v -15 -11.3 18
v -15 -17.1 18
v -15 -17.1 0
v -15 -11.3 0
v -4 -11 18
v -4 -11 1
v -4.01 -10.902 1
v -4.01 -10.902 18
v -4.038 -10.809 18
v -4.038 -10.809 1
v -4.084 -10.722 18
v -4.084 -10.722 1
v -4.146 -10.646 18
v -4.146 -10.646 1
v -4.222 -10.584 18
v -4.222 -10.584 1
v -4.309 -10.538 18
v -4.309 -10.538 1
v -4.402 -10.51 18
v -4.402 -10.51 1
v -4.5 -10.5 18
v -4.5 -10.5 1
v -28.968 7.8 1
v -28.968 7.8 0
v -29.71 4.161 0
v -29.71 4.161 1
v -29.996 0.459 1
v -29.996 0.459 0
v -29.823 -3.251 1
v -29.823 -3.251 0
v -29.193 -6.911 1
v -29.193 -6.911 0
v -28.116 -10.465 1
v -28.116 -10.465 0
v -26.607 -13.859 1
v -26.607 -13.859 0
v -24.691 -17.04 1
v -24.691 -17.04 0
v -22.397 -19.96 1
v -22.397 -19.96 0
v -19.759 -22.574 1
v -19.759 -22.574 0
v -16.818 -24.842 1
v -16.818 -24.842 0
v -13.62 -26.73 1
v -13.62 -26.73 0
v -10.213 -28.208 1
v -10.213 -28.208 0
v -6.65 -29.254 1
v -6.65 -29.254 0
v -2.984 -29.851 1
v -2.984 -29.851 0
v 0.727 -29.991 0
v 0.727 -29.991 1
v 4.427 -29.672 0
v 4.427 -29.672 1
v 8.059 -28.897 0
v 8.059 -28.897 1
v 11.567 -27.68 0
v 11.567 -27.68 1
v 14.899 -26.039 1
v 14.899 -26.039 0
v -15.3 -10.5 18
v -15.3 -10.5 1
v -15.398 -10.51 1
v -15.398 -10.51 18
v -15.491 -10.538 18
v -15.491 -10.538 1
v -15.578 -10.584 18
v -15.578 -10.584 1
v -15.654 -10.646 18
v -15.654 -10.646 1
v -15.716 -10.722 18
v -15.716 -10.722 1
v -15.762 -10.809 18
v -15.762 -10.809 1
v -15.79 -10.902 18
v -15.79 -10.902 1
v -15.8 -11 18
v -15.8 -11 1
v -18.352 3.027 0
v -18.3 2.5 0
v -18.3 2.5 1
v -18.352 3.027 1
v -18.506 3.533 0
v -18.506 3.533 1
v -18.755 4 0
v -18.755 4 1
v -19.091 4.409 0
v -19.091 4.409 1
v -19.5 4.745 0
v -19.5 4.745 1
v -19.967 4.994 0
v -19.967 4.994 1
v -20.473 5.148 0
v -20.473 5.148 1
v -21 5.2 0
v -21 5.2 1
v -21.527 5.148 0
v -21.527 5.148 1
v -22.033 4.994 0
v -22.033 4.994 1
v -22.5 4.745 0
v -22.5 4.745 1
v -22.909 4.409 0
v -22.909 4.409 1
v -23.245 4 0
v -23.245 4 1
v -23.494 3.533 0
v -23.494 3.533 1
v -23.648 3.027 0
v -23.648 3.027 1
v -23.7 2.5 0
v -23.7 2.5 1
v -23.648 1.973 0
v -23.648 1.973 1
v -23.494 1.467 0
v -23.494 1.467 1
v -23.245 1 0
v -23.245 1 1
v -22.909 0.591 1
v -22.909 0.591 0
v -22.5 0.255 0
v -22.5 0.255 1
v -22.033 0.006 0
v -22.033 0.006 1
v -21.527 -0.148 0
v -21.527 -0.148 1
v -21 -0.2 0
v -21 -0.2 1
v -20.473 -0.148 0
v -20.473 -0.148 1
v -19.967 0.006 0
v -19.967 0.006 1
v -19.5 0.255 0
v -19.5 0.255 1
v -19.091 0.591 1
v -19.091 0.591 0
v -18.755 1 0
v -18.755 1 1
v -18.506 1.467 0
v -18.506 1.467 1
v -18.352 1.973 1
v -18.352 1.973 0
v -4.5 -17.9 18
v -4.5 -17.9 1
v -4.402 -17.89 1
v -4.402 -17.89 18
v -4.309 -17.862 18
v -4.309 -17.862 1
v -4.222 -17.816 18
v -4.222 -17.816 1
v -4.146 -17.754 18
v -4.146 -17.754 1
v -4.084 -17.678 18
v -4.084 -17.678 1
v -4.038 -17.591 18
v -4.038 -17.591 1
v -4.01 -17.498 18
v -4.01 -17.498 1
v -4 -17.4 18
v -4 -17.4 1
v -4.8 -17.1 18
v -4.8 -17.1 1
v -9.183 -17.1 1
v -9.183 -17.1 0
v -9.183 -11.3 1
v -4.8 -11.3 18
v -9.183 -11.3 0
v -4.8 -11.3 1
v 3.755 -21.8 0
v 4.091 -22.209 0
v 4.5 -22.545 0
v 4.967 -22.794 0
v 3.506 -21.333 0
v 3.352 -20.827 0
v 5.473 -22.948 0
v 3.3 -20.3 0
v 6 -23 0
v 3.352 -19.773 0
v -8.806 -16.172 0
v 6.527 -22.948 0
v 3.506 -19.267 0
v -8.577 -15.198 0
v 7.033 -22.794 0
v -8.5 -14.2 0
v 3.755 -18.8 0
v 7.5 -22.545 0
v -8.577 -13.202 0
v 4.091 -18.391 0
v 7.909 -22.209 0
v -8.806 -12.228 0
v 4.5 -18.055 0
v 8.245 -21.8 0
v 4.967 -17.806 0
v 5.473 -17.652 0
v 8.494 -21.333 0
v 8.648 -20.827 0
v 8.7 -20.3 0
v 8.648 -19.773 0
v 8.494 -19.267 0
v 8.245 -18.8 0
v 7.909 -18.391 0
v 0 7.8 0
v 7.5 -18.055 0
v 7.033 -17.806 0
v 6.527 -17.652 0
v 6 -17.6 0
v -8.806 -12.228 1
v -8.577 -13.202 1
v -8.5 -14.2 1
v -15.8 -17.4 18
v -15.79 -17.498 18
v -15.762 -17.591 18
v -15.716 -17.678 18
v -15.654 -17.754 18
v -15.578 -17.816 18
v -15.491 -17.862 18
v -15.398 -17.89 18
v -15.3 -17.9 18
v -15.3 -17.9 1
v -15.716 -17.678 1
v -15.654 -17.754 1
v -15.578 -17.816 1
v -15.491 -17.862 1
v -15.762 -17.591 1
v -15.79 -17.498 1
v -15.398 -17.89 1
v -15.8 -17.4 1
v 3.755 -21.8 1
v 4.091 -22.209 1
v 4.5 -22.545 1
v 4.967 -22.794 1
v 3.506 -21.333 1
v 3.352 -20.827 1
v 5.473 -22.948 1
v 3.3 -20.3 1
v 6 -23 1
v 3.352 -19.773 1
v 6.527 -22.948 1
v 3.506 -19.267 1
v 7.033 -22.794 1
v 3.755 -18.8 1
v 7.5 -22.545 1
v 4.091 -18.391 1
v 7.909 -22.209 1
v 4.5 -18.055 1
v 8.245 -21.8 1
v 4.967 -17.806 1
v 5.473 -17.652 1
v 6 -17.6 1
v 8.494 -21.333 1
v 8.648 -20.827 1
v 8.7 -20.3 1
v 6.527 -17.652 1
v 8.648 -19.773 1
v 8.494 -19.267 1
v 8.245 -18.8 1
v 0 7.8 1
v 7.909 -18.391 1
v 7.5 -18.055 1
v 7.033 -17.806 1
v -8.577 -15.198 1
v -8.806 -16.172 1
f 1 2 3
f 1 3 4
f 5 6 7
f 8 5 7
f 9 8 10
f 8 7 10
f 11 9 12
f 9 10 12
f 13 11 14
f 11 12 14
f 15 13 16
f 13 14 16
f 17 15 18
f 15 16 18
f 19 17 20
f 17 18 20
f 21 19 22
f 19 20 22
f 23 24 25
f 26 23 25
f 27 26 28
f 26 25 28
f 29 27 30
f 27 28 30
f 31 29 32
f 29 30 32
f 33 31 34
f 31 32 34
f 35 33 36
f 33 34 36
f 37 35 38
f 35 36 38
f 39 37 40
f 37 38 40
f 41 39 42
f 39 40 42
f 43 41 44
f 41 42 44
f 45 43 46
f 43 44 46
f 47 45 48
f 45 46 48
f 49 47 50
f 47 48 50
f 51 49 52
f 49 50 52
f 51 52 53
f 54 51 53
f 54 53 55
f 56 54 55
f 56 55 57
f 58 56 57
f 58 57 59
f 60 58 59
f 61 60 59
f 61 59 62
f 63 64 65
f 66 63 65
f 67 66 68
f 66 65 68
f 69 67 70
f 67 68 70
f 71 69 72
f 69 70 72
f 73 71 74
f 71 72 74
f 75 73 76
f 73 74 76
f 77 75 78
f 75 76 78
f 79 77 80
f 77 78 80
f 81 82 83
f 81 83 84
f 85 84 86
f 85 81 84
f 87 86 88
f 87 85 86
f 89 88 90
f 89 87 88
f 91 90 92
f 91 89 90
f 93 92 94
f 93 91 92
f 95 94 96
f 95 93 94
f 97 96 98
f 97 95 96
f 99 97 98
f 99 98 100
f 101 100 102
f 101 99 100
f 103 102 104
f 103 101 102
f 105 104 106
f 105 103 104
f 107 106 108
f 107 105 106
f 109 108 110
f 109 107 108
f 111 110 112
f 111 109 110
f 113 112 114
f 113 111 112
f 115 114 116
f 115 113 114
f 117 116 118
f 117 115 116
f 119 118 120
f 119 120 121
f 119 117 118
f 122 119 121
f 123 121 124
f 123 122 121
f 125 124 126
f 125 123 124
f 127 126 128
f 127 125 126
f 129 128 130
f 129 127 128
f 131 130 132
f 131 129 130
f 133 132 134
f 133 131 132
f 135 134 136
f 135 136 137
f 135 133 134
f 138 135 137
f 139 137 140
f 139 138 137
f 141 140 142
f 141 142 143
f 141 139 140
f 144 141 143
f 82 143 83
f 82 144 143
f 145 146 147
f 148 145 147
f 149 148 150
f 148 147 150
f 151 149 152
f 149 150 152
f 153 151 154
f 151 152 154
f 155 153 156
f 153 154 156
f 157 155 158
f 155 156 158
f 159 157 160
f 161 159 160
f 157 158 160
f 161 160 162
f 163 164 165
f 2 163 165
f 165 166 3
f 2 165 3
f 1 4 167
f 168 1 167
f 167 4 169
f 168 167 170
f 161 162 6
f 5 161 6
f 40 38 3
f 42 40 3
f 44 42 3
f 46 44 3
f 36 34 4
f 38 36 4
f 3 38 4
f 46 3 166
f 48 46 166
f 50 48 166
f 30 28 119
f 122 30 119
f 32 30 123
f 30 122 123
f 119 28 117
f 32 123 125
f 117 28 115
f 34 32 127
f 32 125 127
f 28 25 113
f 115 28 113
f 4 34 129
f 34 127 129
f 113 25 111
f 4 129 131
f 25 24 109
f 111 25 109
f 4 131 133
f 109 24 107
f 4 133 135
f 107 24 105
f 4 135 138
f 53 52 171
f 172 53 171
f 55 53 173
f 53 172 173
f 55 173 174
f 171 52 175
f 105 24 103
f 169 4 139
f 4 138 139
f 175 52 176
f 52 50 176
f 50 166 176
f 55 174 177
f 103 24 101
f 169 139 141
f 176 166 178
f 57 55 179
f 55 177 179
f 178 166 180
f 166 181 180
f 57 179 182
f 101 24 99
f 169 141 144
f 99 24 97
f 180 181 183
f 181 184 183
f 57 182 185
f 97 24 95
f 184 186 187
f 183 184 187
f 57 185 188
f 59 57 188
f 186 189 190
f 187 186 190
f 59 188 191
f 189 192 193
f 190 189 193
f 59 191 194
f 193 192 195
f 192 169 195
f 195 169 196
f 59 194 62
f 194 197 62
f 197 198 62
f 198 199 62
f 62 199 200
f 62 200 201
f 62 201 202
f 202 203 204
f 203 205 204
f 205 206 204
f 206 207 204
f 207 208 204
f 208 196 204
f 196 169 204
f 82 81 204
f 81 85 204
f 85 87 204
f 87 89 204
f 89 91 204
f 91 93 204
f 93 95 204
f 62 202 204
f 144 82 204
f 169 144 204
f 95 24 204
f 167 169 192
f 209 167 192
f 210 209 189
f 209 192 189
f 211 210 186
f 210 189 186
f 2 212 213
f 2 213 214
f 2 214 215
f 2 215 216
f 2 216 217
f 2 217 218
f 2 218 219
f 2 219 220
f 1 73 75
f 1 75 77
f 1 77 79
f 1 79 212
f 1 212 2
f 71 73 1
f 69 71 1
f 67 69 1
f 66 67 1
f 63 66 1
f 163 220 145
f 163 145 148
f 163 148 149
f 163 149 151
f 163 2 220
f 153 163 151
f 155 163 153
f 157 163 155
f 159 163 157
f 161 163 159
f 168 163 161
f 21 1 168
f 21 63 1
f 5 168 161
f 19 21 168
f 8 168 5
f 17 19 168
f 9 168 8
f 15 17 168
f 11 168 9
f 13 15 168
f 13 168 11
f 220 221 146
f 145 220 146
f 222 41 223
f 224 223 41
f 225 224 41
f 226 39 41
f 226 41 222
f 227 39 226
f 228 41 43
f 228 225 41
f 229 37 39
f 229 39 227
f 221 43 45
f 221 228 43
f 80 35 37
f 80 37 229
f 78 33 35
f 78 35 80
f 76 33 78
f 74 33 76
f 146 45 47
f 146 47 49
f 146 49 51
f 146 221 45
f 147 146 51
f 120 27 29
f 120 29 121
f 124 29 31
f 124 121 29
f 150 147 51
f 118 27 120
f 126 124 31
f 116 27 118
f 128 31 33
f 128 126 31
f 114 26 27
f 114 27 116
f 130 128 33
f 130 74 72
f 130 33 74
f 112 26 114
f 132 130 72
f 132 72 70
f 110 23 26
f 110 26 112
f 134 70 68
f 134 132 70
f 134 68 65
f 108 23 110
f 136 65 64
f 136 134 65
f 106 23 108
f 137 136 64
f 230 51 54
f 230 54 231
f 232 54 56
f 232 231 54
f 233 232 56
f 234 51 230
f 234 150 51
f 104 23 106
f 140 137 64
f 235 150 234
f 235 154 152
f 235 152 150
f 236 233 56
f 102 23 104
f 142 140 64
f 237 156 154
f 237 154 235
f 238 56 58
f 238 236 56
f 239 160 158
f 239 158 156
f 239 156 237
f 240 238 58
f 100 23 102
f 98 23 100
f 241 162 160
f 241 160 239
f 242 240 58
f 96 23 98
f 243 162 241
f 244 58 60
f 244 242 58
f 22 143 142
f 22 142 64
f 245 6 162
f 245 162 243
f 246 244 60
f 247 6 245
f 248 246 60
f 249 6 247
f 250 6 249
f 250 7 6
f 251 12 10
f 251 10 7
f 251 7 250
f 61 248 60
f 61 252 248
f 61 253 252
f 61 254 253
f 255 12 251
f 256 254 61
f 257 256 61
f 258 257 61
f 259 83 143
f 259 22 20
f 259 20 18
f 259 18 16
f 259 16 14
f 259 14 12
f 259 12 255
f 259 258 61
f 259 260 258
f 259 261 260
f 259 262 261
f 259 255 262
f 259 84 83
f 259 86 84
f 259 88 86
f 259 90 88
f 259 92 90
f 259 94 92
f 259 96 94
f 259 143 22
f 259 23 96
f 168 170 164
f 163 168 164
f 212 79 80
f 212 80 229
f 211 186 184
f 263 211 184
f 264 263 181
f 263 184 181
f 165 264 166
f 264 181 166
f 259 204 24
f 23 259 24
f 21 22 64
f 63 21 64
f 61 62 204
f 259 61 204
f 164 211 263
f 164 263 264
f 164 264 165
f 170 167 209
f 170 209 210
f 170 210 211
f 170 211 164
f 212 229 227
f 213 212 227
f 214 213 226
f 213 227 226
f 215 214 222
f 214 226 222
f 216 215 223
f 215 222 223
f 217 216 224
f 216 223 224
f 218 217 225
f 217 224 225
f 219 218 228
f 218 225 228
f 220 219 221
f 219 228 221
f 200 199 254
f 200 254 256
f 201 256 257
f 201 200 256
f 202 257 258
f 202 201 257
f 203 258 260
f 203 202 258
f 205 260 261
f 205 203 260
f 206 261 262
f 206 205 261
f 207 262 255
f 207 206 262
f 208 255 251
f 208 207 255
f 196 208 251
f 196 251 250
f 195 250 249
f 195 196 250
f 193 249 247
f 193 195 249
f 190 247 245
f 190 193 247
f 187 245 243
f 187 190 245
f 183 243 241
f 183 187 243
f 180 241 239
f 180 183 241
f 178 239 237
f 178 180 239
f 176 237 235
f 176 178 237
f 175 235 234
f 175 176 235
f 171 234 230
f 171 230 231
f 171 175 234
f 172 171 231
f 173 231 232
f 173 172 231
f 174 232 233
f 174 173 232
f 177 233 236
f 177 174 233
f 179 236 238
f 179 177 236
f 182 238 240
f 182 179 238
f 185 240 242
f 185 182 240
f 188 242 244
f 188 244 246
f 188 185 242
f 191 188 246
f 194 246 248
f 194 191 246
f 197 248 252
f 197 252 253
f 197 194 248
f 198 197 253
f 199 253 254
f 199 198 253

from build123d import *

# Parameters (mm, degrees)
F0_R     = 2.7
F1_DEPTH = 1
F2_DEPTH = 18


# Not quite as in the source:
# - a feature names something its author has since deleted; it is built from what else it names


with BuildPart() as f1:
    # F0 (on Top) → F1 (new body)
    with BuildSketch(Plane.XY):
        with BuildLine():
            Line((0, 7.8000635883), (-28.9682413691, 7.8000635883))
            ThreePointArc((-28.9682413691, 7.8000635883), (-18.3237536434, -23.7537376515), (14.8986014601, -26.039041352))
            Line((14.8986014601, -26.039041352), (0, 7.8000635883))
        make_face()
        with BuildLine():
            ThreePointArc((-9.6558443136, -17.9), (-21.5, -14.2), (-9.6558443136, -10.5))
            Line((-9.6558443136, -10.5), (-4.5, -10.5))
            ThreePointArc((-4.5, -10.5), (-4.1464466094, -10.6464466094), (-4, -11))
            Line((-4, -11), (-4, -17.4))
            ThreePointArc((-4, -17.4), (-4.1464466094, -17.7535533906), (-4.5, -17.9))
            Line((-4.5, -17.9), (-9.6558443136, -17.9))
        make_face(mode=Mode.SUBTRACT)
        with Locations((6, -20.3)):
            Circle(F0_R, mode=Mode.SUBTRACT)
        with Locations((-21, 2.5)):
            Circle(F0_R, mode=Mode.SUBTRACT)
        with BuildLine():
            Line((-15.3, -10.5), (-9.6558443136, -10.5))
            ThreePointArc((-9.6558443136, -10.5), (-21.5, -14.2), (-9.6558443136, -17.9))
            Line((-9.6558443136, -17.9), (-15.3, -17.9))
            ThreePointArc((-15.3, -17.9), (-15.6535533906, -17.7535533906), (-15.8, -17.4))
            Line((-15.8, -17.4), (-15.8, -11))
            ThreePointArc((-15.8, -11), (-15.6535533906, -10.6464466094), (-15.3, -10.5))
        make_face()
        with BuildLine():
            Line((-15, -11.3), (-9.1827841711, -11.3))
            ThreePointArc((-9.1827841711, -11.3), (-9.4049974508, -10.8915341207), (-9.6558443136, -10.5))
            Line((-9.6558443136, -10.5), (-15.3, -10.5))
            ThreePointArc((-15.3, -10.5), (-15.6535533906, -10.6464466094), (-15.8, -11))
            Line((-15.8, -11), (-15.8, -17.4))
            ThreePointArc((-15.8, -17.4), (-15.6535533906, -17.7535533906), (-15.3, -17.9))
            Line((-15.3, -17.9), (-9.6558443136, -17.9))
            ThreePointArc((-9.6558443136, -17.9), (-9.4049974508, -17.5084658793), (-9.1827841711, -17.1))
            Line((-9.1827841711, -17.1), (-15, -17.1))
            Line((-15, -17.1), (-15, -11.3))
        make_face()
        with BuildLine():
            ThreePointArc((-9.6558443136, -10.5), (-9.4049974508, -10.8915341207), (-9.1827841711, -11.3))
            Line((-9.1827841711, -11.3), (-4.8, -11.3))
            Line((-4.8, -11.3), (-4.8, -17.1))
            Line((-4.8, -17.1), (-9.1827841711, -17.1))
            ThreePointArc((-9.1827841711, -17.1), (-9.4049974508, -17.5084658793), (-9.6558443136, -17.9))
            Line((-9.6558443136, -17.9), (-4.5, -17.9))
            ThreePointArc((-4.5, -17.9), (-4.1464466094, -17.7535533906), (-4, -17.4))
            Line((-4, -17.4), (-4, -11))
            ThreePointArc((-4, -11), (-4.1464466094, -10.6464466094), (-4.5, -10.5))
            Line((-4.5, -10.5), (-9.6558443136, -10.5))
        make_face()
        with BuildLine():
            ThreePointArc((-9.1827841711, -11.3), (-8.6729982263, -12.7103528753), (-8.5, -14.2))
            ThreePointArc((-8.5, -14.2), (-8.6729982263, -15.6896471247), (-9.1827841711, -17.1))
            Line((-9.1827841711, -17.1), (-4.8, -17.1))
            Line((-4.8, -17.1), (-4.8, -11.3))
            Line((-4.8, -11.3), (-9.1827841711, -11.3))
        make_face()
    extrude(amount=F1_DEPTH)

    # F0 (on Top) → F2 (join)
    with BuildSketch(Plane.XY):
        with BuildLine():
            Line((-15, -11.3), (-9.1827841711, -11.3))
            ThreePointArc((-9.1827841711, -11.3), (-9.4049974508, -10.8915341207), (-9.6558443136, -10.5))
            Line((-9.6558443136, -10.5), (-15.3, -10.5))
            ThreePointArc((-15.3, -10.5), (-15.6535533906, -10.6464466094), (-15.8, -11))
            Line((-15.8, -11), (-15.8, -17.4))
            ThreePointArc((-15.8, -17.4), (-15.6535533906, -17.7535533906), (-15.3, -17.9))
            Line((-15.3, -17.9), (-9.6558443136, -17.9))
            ThreePointArc((-9.6558443136, -17.9), (-9.4049974508, -17.5084658793), (-9.1827841711, -17.1))
            Line((-9.1827841711, -17.1), (-15, -17.1))
            Line((-15, -17.1), (-15, -11.3))
        make_face()
        with BuildLine():
            ThreePointArc((-9.6558443136, -10.5), (-9.4049974508, -10.8915341207), (-9.1827841711, -11.3))
            Line((-9.1827841711, -11.3), (-4.8, -11.3))
            Line((-4.8, -11.3), (-4.8, -17.1))
            Line((-4.8, -17.1), (-9.1827841711, -17.1))
            ThreePointArc((-9.1827841711, -17.1), (-9.4049974508, -17.5084658793), (-9.6558443136, -17.9))
            Line((-9.6558443136, -17.9), (-4.5, -17.9))
            ThreePointArc((-4.5, -17.9), (-4.1464466094, -17.7535533906), (-4, -17.4))
            Line((-4, -17.4), (-4, -11))
            ThreePointArc((-4, -11), (-4.1464466094, -10.6464466094), (-4.5, -10.5))
            Line((-4.5, -10.5), (-9.6558443136, -10.5))
        make_face()
    extrude(amount=F2_DEPTH)


solid = f1.part
